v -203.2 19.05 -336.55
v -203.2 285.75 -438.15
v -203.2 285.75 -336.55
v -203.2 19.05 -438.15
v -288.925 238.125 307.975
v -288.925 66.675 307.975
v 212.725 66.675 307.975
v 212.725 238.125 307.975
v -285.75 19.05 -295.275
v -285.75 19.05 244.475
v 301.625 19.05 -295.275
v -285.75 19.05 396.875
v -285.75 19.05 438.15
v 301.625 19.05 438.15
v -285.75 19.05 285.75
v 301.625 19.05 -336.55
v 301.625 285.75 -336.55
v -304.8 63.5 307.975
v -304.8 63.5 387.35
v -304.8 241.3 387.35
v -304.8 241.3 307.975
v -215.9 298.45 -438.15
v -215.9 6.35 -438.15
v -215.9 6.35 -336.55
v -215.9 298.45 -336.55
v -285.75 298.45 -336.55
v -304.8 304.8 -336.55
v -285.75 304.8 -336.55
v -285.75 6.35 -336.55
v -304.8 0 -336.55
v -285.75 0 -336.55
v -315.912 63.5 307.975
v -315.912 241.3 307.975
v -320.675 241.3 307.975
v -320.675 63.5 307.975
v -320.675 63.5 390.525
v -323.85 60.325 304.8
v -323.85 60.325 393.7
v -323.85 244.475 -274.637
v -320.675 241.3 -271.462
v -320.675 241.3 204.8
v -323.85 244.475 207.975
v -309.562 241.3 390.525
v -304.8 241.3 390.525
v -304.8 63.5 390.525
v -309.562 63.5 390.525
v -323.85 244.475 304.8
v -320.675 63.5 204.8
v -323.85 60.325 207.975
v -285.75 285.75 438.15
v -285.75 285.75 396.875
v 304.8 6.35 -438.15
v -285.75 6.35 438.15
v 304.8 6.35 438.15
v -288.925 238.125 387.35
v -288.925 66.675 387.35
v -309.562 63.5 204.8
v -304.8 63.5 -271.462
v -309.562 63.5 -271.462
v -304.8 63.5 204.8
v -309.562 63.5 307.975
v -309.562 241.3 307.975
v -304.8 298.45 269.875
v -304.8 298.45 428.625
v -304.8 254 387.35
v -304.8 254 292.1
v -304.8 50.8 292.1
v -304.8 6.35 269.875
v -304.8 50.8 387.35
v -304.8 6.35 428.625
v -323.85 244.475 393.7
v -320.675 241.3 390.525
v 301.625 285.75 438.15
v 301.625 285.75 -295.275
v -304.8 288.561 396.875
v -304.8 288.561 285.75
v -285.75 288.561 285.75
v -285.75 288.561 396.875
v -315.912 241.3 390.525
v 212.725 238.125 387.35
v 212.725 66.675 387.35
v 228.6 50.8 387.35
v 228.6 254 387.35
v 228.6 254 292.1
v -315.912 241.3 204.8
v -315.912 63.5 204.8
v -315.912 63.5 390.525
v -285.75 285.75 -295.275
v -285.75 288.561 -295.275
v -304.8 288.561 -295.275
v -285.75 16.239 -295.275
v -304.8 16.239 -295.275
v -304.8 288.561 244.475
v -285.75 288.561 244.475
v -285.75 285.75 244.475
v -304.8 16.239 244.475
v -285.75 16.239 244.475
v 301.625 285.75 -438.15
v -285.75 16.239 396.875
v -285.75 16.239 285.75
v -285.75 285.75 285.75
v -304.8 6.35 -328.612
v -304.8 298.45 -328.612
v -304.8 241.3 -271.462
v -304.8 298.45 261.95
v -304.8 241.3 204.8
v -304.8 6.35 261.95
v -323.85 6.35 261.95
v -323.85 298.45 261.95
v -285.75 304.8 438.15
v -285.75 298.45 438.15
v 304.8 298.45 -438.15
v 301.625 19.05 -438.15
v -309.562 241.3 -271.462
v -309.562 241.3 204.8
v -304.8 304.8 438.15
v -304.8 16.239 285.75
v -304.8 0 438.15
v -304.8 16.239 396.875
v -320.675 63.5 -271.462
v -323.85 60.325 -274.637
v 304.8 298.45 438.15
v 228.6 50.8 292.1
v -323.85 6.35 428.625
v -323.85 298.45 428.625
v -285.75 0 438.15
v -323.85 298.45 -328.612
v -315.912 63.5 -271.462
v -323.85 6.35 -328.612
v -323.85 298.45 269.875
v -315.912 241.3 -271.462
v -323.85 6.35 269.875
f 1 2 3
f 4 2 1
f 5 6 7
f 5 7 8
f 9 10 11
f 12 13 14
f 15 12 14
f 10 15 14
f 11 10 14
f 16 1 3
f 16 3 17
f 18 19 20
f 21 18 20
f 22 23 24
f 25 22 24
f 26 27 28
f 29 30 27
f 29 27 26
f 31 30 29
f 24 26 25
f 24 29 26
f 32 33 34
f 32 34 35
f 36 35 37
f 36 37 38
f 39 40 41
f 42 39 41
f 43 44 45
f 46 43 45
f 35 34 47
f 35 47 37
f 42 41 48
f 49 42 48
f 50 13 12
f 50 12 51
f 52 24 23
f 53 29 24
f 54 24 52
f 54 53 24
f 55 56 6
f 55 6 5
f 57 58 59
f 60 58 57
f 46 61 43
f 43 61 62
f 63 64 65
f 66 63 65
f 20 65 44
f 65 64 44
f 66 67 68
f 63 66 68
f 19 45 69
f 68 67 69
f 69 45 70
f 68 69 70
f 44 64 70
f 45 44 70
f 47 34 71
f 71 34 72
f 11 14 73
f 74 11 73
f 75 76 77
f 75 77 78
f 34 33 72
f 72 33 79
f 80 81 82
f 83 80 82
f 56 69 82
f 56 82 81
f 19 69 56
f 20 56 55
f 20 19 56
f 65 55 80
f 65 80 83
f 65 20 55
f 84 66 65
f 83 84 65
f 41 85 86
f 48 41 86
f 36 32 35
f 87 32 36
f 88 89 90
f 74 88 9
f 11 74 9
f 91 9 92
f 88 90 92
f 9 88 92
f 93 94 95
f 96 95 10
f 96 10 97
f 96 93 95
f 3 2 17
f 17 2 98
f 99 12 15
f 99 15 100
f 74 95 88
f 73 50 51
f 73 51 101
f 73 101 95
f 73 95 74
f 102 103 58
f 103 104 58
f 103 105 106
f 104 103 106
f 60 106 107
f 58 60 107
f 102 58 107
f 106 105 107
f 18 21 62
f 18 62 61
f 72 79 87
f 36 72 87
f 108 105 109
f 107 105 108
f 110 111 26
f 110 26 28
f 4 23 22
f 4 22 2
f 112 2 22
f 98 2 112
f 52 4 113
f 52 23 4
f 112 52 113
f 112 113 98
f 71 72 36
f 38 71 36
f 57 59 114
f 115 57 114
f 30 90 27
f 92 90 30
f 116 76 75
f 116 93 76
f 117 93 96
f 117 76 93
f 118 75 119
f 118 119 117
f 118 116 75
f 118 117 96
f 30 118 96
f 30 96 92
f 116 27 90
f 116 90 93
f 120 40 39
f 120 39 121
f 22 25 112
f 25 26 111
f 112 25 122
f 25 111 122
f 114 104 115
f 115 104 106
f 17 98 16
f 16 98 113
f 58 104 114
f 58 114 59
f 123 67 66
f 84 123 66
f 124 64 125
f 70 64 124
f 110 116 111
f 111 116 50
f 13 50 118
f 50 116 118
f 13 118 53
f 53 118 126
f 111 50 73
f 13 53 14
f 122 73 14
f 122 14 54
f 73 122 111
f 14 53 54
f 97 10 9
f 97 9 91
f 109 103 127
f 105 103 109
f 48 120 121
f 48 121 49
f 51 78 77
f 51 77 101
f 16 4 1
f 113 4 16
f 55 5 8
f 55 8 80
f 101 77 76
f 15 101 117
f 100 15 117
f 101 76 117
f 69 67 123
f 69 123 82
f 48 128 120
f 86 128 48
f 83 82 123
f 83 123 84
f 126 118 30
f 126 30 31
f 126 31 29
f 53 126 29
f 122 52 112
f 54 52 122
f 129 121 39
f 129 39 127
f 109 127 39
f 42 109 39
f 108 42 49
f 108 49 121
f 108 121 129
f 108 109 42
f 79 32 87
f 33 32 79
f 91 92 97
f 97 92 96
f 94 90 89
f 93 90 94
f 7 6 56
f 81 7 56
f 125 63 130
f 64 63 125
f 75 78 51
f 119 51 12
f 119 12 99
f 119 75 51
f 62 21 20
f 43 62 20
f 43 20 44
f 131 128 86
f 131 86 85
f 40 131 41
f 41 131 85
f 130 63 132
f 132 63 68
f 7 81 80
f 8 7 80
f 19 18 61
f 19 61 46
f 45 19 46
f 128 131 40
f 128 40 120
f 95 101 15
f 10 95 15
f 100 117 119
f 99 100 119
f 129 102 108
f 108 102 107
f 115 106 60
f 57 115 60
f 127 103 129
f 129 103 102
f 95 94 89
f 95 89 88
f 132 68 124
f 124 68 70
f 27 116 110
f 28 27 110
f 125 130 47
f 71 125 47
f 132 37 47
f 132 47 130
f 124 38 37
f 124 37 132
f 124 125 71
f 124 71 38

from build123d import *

# Parameters (mm, degrees)
F0_W          = 609.6
F0_H          = 876.3
F1_DEPTH      = 304.8
F2_W          = 88.9
F2_H          = 101.6
F3_DEPTH      = 304.801
F4_W          = 272.3213114754
F4_H          = 692.15
F5_DEPTH      = 19.05
F6_W          = 590.55
F6_H          = 6.35
F7_DEPTH      = 876.301
F8_W          = 587.375
F8_H          = 266.7
F9_DEPTH      = 733.425
F10_W         = 272.3213114754
F10_H         = 41.275
F11_DEPTH     = 19.05
F12_W         = 292.1
F12_H         = 590.5627
F12_W_2       = 177.8
F12_H_2       = 476.2627
F13_DEPTH     = 19.05
F14_W         = 6.35
F14_H         = 177.8
F15_DEPTH     = 476.2627
F16_SIZE      = 3.175
F17_W         = 292.1
F17_H         = 158.75
F17_W_2       = 177.8
F17_H_2       = 82.55
F18_DEPTH     = 19.05
F19_W         = 6.35
F19_H         = 177.8
F20_DEPTH     = 82.55
F21_SIZE      = 3.175
F22_W         = 504.825
F22_H         = 266.7
F23_DEPTH     = 101.6
F24_W         = 203.2
F24_H         = 95.25
F25_DEPTH     = 533.4
F26_T         = 15.875
F26_T3_DEPTH  = 37.249261314
F26_T5_DEPTH  = 37.249261314
F26_T7_DEPTH  = 37.249261314
F26_T9_DEPTH  = 37.249261314
F26_T11_DEPTH = 36.5125
F26_T13_DEPTH = 209.55
F26_T15_DEPTH = 114.3
F26_T17_DEPTH = 127
F26_T19_DEPTH = 234.95
F26_T21_DEPTH = 111.125
F26_T23_DEPTH = 36.5125


# Not quite as in the source:
# - a shell that OpenCascade refuses in one call is made with other operations: the cavity is built on its own and cut out


with BuildPart() as f1:
    # F0 (on Front) → F1 (new body)
    with BuildSketch(Plane.XZ):
        Rectangle(F0_W, F0_H)
    extrude(amount=-F1_DEPTH)

    # F2 (on face) → F3 (cut, through all)
    with BuildSketch(Plane.XZ):
        with Locations((-260.35, -387.35)):
            Rectangle(F2_W, F2_H)
    extrude(amount=-F3_DEPTH, mode=Mode.SUBTRACT)

    # F4 (on face) → F5 (cut)
    with BuildSketch(Plane(origin=(-304.8, 0, 0), x_dir=(0, -1, 0), z_dir=(-1, 0, 0))):
        with Locations((-152.4, 50.8)):
            Rectangle(F4_W, F4_H)
    extrude(amount=-F5_DEPTH, mode=Mode.SUBTRACT)

    # F6 (on face) → F7 (cut, through all)
    with BuildSketch(Plane.XY.offset(438.15)):
        with Locations((9.525, 301.625)):
            Rectangle(F6_W, F6_H)
        with Locations((9.525, 3.175)):
            Rectangle(F6_W, F6_H)
    extrude(amount=-F7_DEPTH, mode=Mode.SUBTRACT)

    # F8 (on face) → F9 (cut, through all)
    with BuildSketch(Plane.XY.offset(438.15)):
        with Locations((7.9375, 152.4)):
            Rectangle(F8_W, F8_H)
    extrude(amount=-F9_DEPTH, mode=Mode.SUBTRACT)

    # F10 (on face) → F11 (join, through all)
    with BuildSketch(Plane(origin=(-304.8, 0, 0), x_dir=(0, -1, 0), z_dir=(-1, 0, 0))):
        with Locations((-152.4, 265.1125)):
            Rectangle(F10_W, F10_H)
    extrude(amount=-F11_DEPTH)

    # F22 (on face) → F23 (cut)
    with BuildSketch(Plane(origin=(0, 0, -438.15), x_dir=(1, 0, 0), z_dir=(0, 0, -1))):
        with Locations((49.2125, -152.4)):
            Rectangle(F22_W, F22_H)
    extrude(amount=-F23_DEPTH, mode=Mode.SUBTRACT)


with BuildPart() as f13:
    # F12 (on face) → F13 (new body)
    with BuildSketch(Plane(origin=(-304.8, 0, 0), x_dir=(0, -1, 0), z_dir=(-1, 0, 0))):
        with Locations((-152.4, -33.33115)):
            Rectangle(F12_W, F12_H)
        with Locations((-152.4, -33.33115)):
            Rectangle(F12_W_2, F12_H_2, mode=Mode.SUBTRACT)
    extrude(amount=F13_DEPTH)

    # F14 (on face) → F15 (join, through all)
    with BuildSketch(Plane.XY.offset(-271.4625)):
        with Locations((-312.7375, 152.4)):
            Rectangle(F14_W, F14_H)
    extrude(amount=F15_DEPTH)

    # F16
    f16_edges = [f13.edges().sort_by_distance(p)[0] for p in [
        (-323.85, 241.3, -33.33115),
        (-323.85, 152.4, -271.4625),
        (-323.85, 63.5, -33.33115),
        (-323.85, 152.4, 204.8002),
    ]]
    chamfer(f16_edges, length=F16_SIZE)


with BuildPart() as f18:
    # F17 (on face) → F18 (new body)
    with BuildSketch(Plane(origin=(-304.8, 0, 0), x_dir=(0, -1, 0), z_dir=(-1, 0, 0))):
        with Locations((-152.4, 349.25)):
            Rectangle(F17_W, F17_H)
        with Locations((-152.4, 349.25)):
            Rectangle(F17_W_2, F17_H_2, mode=Mode.SUBTRACT)
    extrude(amount=F18_DEPTH)

    # F19 (on face) → F20 (join, through all)
    with BuildSketch(Plane.XY.offset(307.975)):
        with Locations((-312.7375, 152.4)):
            Rectangle(F19_W, F19_H)
    extrude(amount=F20_DEPTH)

    # F21
    f21_edges = [f18.edges().sort_by_distance(p)[0] for p in [
        (-323.85, 152.4, 307.975),
        (-323.85, 241.3, 349.25),
        (-323.85, 152.4, 390.525),
        (-323.85, 63.5, 349.25),
    ]]
    chamfer(f21_edges, length=F21_SIZE)

    # F24 (on face) → F25 (join)
    with BuildSketch(Plane.YZ.offset(-304.8)):
        with Locations((152.4, 339.725)):
            Rectangle(F24_W, F24_H)
    extrude(amount=F25_DEPTH)

    # F26: shell of thickness 15.875, made by hand


with BuildPart() as f26_core1:
    # F26_t2: copy of F18
    add(f18.part)

    # the walls: a layer under each face that stays
    f26_faces = [f26_core1.faces().sort_by_distance(p)[0] for p in [
        (-323.85, 249.7666666667, 296.3333333333),
        (-322.2625, 152.4, 306.3875),
        (-322.2625, 61.9125, 349.25),
        (-322.2625, 242.8875, 349.25),
        (-322.2625, 152.4, 392.1125),
        (-314.325, 152.4, 428.625),
        (-314.325, 298.45, 349.25),
        (-314.325, 152.4, 269.875),
        (-314.325, 6.35, 349.25),
        (-318.29375, 152.4, 307.975),
        (-318.29375, 63.5, 349.25),
        (-318.29375, 241.3, 349.25),
        (-318.29375, 152.4, 390.525),
        (-304.8, 249.7666666667, 402.1666666667),
        (-315.9125, 152.4, 349.25),
        (-38.1, 254, 339.725),
        (-38.1, 152.4, 292.1),
        (-38.1, 50.8, 339.725),
        (-307.18125, 63.5, 349.25),
        (-307.18125, 152.4, 390.525),
        (-307.18125, 241.3, 349.25),
        (-304.8, 152.4, 347.6625),
        (228.6, 152.4, 339.725),
        (-307.18125, 152.4, 307.975),
        (-309.5625, 152.4, 349.25),
    ]]
    thicken(f26_faces, amount=-F26_T, mode=Mode.SUBTRACT)

    # F26_s4 → F26_t3 (cut)
    with BuildSketch(Plane(origin=(4.5928978099, 4.5928978099, 4.5928978099), x_dir=(-0.7071067812, 0.7071067812, 0), z_dir=(0.5773502692, 0.5773502692, 0.5773502692))):
        Polygon((271.8908726623, 356.5892701441), (263.7152476623, 342.7036353262), (255.7777476623, 347.2863530879), (255.7777476623, 356.4517886113), align=None)
    extrude(amount=F26_T3_DEPTH, mode=Mode.SUBTRACT)

    # F26_s6 → F26_t5 (cut)
    with BuildSketch(Plane(origin=(-97.0071021901, 97.0071021901, -97.0071021901), x_dir=(0.7071067812, 0.7071067812, 0), z_dir=(0.5773502692, -0.5773502692, 0.5773502692))):
        Polygon((-56.3647257567, 481.0233490775), (-48.1891007567, 467.1377142596), (-40.2516007567, 471.7204320213), (-40.2516007567, 480.8858675446), align=None)
    extrude(amount=F26_T5_DEPTH, mode=Mode.SUBTRACT)

    # F26_s8 → F26_t7 (cut)
    with BuildSketch(Plane(origin=(-228.2404355234, -228.2404355234, 228.2404355234), x_dir=(-0.7071067812, 0.7071067812, 0), z_dir=(0.5773502692, 0.5773502692, -0.5773502692))):
        Polygon((271.8908726623, 213.7335916339), (255.7777476623, 213.8710731668), (255.7777476623, 223.0365086901), (263.7152476623, 227.6192264518), align=None)
    extrude(amount=F26_T7_DEPTH, mode=Mode.SUBTRACT)

    # F26_s10 → F26_t9 (cut)
    with BuildSketch(Plane(origin=(-329.8404355234, 329.8404355234, 329.8404355234), x_dir=(0.7071067812, 0.7071067812, 0), z_dir=(0.5773502692, -0.5773502692, -0.5773502692))):
        Polygon((-56.3647257567, 89.2995127005), (-40.2516007567, 89.4369942334), (-40.2516007567, 98.6024297568), (-48.1891007567, 103.1851475184), align=None)
    extrude(amount=F26_T9_DEPTH, mode=Mode.SUBTRACT)

    # F26_s12 → F26_t11 (cut)
    with BuildSketch(Plane.YZ.offset(-336.55)):
        Polygon((241.14125, 308.13375), (241.3, 292.1), (257.175, 292.1), (257.175, 307.975), align=None)
        Polygon((63.65875, 308.13375), (63.5, 292.1), (47.625, 292.1), (47.625, 307.975), align=None)
        Polygon((63.65875, 390.36625), (47.625, 390.525), (47.625, 406.4), (63.5, 406.4), align=None)
        Polygon((241.14125, 390.36625), (257.175, 390.525), (257.175, 406.4), (241.3, 406.4), align=None)
    extrude(amount=F26_T11_DEPTH, mode=Mode.SUBTRACT)

    # F26_s14 → F26_t13 (cut)
    with BuildSketch(Plane.XZ.offset(-257.175)):
        Polygon((-316.07125, 308.13375), (-315.9125, 292.1), (-300.0375, 292.1), (-300.0375, 307.975), align=None)
        Polygon((-316.07125, 390.36625), (-315.9125, 406.4), (-300.0375, 406.4), (-300.0375, 390.525), align=None)
        Polygon((-309.40375, 390.36625), (-309.5625, 406.4), (-325.4375, 406.4), (-325.4375, 390.525), align=None)
        Polygon((-304.95875, 308.13375), (-288.925, 307.975), (-288.925, 292.1), (-304.8, 292.1), align=None)
        Polygon((-309.40375, 308.13375), (-309.5625, 292.1), (-325.4375, 292.1), (-325.4375, 307.975), align=None)
    extrude(amount=F26_T13_DEPTH, mode=Mode.SUBTRACT)

    # F26_s16 → F26_t15 (cut)
    with BuildSketch(Plane.XY.offset(292.1)):
        Polygon((-316.07125, 63.65875), (-315.9125, 47.625), (-300.0375, 47.625), (-300.0375, 63.5), align=None)
        Polygon((-316.07125, 241.14125), (-315.9125, 257.175), (-300.0375, 257.175), (-300.0375, 241.3), align=None)
        Polygon((-309.40375, 63.65875), (-309.5625, 47.625), (-325.4375, 47.625), (-325.4375, 63.5), align=None)
        Polygon((-309.40375, 241.14125), (-309.5625, 257.175), (-325.4375, 257.175), (-325.4375, 241.3), align=None)
    extrude(amount=F26_T15_DEPTH, mode=Mode.SUBTRACT)

    # F26_s18 → F26_t17 (cut)
    with BuildSketch(Plane.XY.offset(276.225)):
        Polygon((-304.64125, 254.15875), (-320.675, 254), (-320.675, 238.125), (-304.8, 238.125), align=None)
        Polygon((-304.64125, 50.64125), (-320.675, 50.8), (-320.675, 66.675), (-304.8, 66.675), align=None)
    extrude(amount=F26_T17_DEPTH, mode=Mode.SUBTRACT)

    # F26_s20 → F26_t19 (cut)
    with BuildSketch(Plane.XZ.offset(-269.875)):
        Polygon((-304.64125, 291.94125), (-320.675, 292.1), (-320.675, 307.975), (-304.8, 307.975), align=None)
    extrude(amount=F26_T19_DEPTH, mode=Mode.SUBTRACT)

    # F26_s22 → F26_t21 (cut)
    with BuildSketch(Plane.XY.offset(292.1)):
        Polygon((-304.95875, 63.65875), (-304.8, 47.625), (-288.925, 47.625), (-288.925, 63.5), align=None)
        Polygon((-304.95875, 241.14125), (-304.8, 257.175), (-288.925, 257.175), (-288.925, 241.3), align=None)
    extrude(amount=F26_T21_DEPTH, mode=Mode.SUBTRACT)

    # F26_s24 → F26_t23 (cut)
    with BuildSketch(Plane.YZ.offset(-325.4375)):
        Polygon((63.65875, 308.13375), (47.625, 307.975), (47.625, 292.1), (63.5, 292.1), align=None)
        Polygon((63.65875, 390.36625), (47.625, 390.525), (47.625, 406.4), (63.5, 406.4), align=None)
        Polygon((241.14125, 390.36625), (241.3, 406.4), (257.175, 406.4), (257.175, 390.525), align=None)
        Polygon((241.14125, 308.13375), (257.175, 307.975), (257.175, 292.1), (241.3, 292.1), align=None)
    extrude(amount=F26_T23_DEPTH, mode=Mode.SUBTRACT)


with BuildPart() as f18_1:
    add(f18.part)

    # what is left inside the walls is the cavity
    f26_cavity = [f26_core1.part.solids().sort_by_distance(p)[0] for p in [
        (45.508333, 152.4, 308.13375),
    ]]
    add(f26_cavity, mode=Mode.SUBTRACT)


solid = Compound([f1.part, f13.part, f18_1.part])
